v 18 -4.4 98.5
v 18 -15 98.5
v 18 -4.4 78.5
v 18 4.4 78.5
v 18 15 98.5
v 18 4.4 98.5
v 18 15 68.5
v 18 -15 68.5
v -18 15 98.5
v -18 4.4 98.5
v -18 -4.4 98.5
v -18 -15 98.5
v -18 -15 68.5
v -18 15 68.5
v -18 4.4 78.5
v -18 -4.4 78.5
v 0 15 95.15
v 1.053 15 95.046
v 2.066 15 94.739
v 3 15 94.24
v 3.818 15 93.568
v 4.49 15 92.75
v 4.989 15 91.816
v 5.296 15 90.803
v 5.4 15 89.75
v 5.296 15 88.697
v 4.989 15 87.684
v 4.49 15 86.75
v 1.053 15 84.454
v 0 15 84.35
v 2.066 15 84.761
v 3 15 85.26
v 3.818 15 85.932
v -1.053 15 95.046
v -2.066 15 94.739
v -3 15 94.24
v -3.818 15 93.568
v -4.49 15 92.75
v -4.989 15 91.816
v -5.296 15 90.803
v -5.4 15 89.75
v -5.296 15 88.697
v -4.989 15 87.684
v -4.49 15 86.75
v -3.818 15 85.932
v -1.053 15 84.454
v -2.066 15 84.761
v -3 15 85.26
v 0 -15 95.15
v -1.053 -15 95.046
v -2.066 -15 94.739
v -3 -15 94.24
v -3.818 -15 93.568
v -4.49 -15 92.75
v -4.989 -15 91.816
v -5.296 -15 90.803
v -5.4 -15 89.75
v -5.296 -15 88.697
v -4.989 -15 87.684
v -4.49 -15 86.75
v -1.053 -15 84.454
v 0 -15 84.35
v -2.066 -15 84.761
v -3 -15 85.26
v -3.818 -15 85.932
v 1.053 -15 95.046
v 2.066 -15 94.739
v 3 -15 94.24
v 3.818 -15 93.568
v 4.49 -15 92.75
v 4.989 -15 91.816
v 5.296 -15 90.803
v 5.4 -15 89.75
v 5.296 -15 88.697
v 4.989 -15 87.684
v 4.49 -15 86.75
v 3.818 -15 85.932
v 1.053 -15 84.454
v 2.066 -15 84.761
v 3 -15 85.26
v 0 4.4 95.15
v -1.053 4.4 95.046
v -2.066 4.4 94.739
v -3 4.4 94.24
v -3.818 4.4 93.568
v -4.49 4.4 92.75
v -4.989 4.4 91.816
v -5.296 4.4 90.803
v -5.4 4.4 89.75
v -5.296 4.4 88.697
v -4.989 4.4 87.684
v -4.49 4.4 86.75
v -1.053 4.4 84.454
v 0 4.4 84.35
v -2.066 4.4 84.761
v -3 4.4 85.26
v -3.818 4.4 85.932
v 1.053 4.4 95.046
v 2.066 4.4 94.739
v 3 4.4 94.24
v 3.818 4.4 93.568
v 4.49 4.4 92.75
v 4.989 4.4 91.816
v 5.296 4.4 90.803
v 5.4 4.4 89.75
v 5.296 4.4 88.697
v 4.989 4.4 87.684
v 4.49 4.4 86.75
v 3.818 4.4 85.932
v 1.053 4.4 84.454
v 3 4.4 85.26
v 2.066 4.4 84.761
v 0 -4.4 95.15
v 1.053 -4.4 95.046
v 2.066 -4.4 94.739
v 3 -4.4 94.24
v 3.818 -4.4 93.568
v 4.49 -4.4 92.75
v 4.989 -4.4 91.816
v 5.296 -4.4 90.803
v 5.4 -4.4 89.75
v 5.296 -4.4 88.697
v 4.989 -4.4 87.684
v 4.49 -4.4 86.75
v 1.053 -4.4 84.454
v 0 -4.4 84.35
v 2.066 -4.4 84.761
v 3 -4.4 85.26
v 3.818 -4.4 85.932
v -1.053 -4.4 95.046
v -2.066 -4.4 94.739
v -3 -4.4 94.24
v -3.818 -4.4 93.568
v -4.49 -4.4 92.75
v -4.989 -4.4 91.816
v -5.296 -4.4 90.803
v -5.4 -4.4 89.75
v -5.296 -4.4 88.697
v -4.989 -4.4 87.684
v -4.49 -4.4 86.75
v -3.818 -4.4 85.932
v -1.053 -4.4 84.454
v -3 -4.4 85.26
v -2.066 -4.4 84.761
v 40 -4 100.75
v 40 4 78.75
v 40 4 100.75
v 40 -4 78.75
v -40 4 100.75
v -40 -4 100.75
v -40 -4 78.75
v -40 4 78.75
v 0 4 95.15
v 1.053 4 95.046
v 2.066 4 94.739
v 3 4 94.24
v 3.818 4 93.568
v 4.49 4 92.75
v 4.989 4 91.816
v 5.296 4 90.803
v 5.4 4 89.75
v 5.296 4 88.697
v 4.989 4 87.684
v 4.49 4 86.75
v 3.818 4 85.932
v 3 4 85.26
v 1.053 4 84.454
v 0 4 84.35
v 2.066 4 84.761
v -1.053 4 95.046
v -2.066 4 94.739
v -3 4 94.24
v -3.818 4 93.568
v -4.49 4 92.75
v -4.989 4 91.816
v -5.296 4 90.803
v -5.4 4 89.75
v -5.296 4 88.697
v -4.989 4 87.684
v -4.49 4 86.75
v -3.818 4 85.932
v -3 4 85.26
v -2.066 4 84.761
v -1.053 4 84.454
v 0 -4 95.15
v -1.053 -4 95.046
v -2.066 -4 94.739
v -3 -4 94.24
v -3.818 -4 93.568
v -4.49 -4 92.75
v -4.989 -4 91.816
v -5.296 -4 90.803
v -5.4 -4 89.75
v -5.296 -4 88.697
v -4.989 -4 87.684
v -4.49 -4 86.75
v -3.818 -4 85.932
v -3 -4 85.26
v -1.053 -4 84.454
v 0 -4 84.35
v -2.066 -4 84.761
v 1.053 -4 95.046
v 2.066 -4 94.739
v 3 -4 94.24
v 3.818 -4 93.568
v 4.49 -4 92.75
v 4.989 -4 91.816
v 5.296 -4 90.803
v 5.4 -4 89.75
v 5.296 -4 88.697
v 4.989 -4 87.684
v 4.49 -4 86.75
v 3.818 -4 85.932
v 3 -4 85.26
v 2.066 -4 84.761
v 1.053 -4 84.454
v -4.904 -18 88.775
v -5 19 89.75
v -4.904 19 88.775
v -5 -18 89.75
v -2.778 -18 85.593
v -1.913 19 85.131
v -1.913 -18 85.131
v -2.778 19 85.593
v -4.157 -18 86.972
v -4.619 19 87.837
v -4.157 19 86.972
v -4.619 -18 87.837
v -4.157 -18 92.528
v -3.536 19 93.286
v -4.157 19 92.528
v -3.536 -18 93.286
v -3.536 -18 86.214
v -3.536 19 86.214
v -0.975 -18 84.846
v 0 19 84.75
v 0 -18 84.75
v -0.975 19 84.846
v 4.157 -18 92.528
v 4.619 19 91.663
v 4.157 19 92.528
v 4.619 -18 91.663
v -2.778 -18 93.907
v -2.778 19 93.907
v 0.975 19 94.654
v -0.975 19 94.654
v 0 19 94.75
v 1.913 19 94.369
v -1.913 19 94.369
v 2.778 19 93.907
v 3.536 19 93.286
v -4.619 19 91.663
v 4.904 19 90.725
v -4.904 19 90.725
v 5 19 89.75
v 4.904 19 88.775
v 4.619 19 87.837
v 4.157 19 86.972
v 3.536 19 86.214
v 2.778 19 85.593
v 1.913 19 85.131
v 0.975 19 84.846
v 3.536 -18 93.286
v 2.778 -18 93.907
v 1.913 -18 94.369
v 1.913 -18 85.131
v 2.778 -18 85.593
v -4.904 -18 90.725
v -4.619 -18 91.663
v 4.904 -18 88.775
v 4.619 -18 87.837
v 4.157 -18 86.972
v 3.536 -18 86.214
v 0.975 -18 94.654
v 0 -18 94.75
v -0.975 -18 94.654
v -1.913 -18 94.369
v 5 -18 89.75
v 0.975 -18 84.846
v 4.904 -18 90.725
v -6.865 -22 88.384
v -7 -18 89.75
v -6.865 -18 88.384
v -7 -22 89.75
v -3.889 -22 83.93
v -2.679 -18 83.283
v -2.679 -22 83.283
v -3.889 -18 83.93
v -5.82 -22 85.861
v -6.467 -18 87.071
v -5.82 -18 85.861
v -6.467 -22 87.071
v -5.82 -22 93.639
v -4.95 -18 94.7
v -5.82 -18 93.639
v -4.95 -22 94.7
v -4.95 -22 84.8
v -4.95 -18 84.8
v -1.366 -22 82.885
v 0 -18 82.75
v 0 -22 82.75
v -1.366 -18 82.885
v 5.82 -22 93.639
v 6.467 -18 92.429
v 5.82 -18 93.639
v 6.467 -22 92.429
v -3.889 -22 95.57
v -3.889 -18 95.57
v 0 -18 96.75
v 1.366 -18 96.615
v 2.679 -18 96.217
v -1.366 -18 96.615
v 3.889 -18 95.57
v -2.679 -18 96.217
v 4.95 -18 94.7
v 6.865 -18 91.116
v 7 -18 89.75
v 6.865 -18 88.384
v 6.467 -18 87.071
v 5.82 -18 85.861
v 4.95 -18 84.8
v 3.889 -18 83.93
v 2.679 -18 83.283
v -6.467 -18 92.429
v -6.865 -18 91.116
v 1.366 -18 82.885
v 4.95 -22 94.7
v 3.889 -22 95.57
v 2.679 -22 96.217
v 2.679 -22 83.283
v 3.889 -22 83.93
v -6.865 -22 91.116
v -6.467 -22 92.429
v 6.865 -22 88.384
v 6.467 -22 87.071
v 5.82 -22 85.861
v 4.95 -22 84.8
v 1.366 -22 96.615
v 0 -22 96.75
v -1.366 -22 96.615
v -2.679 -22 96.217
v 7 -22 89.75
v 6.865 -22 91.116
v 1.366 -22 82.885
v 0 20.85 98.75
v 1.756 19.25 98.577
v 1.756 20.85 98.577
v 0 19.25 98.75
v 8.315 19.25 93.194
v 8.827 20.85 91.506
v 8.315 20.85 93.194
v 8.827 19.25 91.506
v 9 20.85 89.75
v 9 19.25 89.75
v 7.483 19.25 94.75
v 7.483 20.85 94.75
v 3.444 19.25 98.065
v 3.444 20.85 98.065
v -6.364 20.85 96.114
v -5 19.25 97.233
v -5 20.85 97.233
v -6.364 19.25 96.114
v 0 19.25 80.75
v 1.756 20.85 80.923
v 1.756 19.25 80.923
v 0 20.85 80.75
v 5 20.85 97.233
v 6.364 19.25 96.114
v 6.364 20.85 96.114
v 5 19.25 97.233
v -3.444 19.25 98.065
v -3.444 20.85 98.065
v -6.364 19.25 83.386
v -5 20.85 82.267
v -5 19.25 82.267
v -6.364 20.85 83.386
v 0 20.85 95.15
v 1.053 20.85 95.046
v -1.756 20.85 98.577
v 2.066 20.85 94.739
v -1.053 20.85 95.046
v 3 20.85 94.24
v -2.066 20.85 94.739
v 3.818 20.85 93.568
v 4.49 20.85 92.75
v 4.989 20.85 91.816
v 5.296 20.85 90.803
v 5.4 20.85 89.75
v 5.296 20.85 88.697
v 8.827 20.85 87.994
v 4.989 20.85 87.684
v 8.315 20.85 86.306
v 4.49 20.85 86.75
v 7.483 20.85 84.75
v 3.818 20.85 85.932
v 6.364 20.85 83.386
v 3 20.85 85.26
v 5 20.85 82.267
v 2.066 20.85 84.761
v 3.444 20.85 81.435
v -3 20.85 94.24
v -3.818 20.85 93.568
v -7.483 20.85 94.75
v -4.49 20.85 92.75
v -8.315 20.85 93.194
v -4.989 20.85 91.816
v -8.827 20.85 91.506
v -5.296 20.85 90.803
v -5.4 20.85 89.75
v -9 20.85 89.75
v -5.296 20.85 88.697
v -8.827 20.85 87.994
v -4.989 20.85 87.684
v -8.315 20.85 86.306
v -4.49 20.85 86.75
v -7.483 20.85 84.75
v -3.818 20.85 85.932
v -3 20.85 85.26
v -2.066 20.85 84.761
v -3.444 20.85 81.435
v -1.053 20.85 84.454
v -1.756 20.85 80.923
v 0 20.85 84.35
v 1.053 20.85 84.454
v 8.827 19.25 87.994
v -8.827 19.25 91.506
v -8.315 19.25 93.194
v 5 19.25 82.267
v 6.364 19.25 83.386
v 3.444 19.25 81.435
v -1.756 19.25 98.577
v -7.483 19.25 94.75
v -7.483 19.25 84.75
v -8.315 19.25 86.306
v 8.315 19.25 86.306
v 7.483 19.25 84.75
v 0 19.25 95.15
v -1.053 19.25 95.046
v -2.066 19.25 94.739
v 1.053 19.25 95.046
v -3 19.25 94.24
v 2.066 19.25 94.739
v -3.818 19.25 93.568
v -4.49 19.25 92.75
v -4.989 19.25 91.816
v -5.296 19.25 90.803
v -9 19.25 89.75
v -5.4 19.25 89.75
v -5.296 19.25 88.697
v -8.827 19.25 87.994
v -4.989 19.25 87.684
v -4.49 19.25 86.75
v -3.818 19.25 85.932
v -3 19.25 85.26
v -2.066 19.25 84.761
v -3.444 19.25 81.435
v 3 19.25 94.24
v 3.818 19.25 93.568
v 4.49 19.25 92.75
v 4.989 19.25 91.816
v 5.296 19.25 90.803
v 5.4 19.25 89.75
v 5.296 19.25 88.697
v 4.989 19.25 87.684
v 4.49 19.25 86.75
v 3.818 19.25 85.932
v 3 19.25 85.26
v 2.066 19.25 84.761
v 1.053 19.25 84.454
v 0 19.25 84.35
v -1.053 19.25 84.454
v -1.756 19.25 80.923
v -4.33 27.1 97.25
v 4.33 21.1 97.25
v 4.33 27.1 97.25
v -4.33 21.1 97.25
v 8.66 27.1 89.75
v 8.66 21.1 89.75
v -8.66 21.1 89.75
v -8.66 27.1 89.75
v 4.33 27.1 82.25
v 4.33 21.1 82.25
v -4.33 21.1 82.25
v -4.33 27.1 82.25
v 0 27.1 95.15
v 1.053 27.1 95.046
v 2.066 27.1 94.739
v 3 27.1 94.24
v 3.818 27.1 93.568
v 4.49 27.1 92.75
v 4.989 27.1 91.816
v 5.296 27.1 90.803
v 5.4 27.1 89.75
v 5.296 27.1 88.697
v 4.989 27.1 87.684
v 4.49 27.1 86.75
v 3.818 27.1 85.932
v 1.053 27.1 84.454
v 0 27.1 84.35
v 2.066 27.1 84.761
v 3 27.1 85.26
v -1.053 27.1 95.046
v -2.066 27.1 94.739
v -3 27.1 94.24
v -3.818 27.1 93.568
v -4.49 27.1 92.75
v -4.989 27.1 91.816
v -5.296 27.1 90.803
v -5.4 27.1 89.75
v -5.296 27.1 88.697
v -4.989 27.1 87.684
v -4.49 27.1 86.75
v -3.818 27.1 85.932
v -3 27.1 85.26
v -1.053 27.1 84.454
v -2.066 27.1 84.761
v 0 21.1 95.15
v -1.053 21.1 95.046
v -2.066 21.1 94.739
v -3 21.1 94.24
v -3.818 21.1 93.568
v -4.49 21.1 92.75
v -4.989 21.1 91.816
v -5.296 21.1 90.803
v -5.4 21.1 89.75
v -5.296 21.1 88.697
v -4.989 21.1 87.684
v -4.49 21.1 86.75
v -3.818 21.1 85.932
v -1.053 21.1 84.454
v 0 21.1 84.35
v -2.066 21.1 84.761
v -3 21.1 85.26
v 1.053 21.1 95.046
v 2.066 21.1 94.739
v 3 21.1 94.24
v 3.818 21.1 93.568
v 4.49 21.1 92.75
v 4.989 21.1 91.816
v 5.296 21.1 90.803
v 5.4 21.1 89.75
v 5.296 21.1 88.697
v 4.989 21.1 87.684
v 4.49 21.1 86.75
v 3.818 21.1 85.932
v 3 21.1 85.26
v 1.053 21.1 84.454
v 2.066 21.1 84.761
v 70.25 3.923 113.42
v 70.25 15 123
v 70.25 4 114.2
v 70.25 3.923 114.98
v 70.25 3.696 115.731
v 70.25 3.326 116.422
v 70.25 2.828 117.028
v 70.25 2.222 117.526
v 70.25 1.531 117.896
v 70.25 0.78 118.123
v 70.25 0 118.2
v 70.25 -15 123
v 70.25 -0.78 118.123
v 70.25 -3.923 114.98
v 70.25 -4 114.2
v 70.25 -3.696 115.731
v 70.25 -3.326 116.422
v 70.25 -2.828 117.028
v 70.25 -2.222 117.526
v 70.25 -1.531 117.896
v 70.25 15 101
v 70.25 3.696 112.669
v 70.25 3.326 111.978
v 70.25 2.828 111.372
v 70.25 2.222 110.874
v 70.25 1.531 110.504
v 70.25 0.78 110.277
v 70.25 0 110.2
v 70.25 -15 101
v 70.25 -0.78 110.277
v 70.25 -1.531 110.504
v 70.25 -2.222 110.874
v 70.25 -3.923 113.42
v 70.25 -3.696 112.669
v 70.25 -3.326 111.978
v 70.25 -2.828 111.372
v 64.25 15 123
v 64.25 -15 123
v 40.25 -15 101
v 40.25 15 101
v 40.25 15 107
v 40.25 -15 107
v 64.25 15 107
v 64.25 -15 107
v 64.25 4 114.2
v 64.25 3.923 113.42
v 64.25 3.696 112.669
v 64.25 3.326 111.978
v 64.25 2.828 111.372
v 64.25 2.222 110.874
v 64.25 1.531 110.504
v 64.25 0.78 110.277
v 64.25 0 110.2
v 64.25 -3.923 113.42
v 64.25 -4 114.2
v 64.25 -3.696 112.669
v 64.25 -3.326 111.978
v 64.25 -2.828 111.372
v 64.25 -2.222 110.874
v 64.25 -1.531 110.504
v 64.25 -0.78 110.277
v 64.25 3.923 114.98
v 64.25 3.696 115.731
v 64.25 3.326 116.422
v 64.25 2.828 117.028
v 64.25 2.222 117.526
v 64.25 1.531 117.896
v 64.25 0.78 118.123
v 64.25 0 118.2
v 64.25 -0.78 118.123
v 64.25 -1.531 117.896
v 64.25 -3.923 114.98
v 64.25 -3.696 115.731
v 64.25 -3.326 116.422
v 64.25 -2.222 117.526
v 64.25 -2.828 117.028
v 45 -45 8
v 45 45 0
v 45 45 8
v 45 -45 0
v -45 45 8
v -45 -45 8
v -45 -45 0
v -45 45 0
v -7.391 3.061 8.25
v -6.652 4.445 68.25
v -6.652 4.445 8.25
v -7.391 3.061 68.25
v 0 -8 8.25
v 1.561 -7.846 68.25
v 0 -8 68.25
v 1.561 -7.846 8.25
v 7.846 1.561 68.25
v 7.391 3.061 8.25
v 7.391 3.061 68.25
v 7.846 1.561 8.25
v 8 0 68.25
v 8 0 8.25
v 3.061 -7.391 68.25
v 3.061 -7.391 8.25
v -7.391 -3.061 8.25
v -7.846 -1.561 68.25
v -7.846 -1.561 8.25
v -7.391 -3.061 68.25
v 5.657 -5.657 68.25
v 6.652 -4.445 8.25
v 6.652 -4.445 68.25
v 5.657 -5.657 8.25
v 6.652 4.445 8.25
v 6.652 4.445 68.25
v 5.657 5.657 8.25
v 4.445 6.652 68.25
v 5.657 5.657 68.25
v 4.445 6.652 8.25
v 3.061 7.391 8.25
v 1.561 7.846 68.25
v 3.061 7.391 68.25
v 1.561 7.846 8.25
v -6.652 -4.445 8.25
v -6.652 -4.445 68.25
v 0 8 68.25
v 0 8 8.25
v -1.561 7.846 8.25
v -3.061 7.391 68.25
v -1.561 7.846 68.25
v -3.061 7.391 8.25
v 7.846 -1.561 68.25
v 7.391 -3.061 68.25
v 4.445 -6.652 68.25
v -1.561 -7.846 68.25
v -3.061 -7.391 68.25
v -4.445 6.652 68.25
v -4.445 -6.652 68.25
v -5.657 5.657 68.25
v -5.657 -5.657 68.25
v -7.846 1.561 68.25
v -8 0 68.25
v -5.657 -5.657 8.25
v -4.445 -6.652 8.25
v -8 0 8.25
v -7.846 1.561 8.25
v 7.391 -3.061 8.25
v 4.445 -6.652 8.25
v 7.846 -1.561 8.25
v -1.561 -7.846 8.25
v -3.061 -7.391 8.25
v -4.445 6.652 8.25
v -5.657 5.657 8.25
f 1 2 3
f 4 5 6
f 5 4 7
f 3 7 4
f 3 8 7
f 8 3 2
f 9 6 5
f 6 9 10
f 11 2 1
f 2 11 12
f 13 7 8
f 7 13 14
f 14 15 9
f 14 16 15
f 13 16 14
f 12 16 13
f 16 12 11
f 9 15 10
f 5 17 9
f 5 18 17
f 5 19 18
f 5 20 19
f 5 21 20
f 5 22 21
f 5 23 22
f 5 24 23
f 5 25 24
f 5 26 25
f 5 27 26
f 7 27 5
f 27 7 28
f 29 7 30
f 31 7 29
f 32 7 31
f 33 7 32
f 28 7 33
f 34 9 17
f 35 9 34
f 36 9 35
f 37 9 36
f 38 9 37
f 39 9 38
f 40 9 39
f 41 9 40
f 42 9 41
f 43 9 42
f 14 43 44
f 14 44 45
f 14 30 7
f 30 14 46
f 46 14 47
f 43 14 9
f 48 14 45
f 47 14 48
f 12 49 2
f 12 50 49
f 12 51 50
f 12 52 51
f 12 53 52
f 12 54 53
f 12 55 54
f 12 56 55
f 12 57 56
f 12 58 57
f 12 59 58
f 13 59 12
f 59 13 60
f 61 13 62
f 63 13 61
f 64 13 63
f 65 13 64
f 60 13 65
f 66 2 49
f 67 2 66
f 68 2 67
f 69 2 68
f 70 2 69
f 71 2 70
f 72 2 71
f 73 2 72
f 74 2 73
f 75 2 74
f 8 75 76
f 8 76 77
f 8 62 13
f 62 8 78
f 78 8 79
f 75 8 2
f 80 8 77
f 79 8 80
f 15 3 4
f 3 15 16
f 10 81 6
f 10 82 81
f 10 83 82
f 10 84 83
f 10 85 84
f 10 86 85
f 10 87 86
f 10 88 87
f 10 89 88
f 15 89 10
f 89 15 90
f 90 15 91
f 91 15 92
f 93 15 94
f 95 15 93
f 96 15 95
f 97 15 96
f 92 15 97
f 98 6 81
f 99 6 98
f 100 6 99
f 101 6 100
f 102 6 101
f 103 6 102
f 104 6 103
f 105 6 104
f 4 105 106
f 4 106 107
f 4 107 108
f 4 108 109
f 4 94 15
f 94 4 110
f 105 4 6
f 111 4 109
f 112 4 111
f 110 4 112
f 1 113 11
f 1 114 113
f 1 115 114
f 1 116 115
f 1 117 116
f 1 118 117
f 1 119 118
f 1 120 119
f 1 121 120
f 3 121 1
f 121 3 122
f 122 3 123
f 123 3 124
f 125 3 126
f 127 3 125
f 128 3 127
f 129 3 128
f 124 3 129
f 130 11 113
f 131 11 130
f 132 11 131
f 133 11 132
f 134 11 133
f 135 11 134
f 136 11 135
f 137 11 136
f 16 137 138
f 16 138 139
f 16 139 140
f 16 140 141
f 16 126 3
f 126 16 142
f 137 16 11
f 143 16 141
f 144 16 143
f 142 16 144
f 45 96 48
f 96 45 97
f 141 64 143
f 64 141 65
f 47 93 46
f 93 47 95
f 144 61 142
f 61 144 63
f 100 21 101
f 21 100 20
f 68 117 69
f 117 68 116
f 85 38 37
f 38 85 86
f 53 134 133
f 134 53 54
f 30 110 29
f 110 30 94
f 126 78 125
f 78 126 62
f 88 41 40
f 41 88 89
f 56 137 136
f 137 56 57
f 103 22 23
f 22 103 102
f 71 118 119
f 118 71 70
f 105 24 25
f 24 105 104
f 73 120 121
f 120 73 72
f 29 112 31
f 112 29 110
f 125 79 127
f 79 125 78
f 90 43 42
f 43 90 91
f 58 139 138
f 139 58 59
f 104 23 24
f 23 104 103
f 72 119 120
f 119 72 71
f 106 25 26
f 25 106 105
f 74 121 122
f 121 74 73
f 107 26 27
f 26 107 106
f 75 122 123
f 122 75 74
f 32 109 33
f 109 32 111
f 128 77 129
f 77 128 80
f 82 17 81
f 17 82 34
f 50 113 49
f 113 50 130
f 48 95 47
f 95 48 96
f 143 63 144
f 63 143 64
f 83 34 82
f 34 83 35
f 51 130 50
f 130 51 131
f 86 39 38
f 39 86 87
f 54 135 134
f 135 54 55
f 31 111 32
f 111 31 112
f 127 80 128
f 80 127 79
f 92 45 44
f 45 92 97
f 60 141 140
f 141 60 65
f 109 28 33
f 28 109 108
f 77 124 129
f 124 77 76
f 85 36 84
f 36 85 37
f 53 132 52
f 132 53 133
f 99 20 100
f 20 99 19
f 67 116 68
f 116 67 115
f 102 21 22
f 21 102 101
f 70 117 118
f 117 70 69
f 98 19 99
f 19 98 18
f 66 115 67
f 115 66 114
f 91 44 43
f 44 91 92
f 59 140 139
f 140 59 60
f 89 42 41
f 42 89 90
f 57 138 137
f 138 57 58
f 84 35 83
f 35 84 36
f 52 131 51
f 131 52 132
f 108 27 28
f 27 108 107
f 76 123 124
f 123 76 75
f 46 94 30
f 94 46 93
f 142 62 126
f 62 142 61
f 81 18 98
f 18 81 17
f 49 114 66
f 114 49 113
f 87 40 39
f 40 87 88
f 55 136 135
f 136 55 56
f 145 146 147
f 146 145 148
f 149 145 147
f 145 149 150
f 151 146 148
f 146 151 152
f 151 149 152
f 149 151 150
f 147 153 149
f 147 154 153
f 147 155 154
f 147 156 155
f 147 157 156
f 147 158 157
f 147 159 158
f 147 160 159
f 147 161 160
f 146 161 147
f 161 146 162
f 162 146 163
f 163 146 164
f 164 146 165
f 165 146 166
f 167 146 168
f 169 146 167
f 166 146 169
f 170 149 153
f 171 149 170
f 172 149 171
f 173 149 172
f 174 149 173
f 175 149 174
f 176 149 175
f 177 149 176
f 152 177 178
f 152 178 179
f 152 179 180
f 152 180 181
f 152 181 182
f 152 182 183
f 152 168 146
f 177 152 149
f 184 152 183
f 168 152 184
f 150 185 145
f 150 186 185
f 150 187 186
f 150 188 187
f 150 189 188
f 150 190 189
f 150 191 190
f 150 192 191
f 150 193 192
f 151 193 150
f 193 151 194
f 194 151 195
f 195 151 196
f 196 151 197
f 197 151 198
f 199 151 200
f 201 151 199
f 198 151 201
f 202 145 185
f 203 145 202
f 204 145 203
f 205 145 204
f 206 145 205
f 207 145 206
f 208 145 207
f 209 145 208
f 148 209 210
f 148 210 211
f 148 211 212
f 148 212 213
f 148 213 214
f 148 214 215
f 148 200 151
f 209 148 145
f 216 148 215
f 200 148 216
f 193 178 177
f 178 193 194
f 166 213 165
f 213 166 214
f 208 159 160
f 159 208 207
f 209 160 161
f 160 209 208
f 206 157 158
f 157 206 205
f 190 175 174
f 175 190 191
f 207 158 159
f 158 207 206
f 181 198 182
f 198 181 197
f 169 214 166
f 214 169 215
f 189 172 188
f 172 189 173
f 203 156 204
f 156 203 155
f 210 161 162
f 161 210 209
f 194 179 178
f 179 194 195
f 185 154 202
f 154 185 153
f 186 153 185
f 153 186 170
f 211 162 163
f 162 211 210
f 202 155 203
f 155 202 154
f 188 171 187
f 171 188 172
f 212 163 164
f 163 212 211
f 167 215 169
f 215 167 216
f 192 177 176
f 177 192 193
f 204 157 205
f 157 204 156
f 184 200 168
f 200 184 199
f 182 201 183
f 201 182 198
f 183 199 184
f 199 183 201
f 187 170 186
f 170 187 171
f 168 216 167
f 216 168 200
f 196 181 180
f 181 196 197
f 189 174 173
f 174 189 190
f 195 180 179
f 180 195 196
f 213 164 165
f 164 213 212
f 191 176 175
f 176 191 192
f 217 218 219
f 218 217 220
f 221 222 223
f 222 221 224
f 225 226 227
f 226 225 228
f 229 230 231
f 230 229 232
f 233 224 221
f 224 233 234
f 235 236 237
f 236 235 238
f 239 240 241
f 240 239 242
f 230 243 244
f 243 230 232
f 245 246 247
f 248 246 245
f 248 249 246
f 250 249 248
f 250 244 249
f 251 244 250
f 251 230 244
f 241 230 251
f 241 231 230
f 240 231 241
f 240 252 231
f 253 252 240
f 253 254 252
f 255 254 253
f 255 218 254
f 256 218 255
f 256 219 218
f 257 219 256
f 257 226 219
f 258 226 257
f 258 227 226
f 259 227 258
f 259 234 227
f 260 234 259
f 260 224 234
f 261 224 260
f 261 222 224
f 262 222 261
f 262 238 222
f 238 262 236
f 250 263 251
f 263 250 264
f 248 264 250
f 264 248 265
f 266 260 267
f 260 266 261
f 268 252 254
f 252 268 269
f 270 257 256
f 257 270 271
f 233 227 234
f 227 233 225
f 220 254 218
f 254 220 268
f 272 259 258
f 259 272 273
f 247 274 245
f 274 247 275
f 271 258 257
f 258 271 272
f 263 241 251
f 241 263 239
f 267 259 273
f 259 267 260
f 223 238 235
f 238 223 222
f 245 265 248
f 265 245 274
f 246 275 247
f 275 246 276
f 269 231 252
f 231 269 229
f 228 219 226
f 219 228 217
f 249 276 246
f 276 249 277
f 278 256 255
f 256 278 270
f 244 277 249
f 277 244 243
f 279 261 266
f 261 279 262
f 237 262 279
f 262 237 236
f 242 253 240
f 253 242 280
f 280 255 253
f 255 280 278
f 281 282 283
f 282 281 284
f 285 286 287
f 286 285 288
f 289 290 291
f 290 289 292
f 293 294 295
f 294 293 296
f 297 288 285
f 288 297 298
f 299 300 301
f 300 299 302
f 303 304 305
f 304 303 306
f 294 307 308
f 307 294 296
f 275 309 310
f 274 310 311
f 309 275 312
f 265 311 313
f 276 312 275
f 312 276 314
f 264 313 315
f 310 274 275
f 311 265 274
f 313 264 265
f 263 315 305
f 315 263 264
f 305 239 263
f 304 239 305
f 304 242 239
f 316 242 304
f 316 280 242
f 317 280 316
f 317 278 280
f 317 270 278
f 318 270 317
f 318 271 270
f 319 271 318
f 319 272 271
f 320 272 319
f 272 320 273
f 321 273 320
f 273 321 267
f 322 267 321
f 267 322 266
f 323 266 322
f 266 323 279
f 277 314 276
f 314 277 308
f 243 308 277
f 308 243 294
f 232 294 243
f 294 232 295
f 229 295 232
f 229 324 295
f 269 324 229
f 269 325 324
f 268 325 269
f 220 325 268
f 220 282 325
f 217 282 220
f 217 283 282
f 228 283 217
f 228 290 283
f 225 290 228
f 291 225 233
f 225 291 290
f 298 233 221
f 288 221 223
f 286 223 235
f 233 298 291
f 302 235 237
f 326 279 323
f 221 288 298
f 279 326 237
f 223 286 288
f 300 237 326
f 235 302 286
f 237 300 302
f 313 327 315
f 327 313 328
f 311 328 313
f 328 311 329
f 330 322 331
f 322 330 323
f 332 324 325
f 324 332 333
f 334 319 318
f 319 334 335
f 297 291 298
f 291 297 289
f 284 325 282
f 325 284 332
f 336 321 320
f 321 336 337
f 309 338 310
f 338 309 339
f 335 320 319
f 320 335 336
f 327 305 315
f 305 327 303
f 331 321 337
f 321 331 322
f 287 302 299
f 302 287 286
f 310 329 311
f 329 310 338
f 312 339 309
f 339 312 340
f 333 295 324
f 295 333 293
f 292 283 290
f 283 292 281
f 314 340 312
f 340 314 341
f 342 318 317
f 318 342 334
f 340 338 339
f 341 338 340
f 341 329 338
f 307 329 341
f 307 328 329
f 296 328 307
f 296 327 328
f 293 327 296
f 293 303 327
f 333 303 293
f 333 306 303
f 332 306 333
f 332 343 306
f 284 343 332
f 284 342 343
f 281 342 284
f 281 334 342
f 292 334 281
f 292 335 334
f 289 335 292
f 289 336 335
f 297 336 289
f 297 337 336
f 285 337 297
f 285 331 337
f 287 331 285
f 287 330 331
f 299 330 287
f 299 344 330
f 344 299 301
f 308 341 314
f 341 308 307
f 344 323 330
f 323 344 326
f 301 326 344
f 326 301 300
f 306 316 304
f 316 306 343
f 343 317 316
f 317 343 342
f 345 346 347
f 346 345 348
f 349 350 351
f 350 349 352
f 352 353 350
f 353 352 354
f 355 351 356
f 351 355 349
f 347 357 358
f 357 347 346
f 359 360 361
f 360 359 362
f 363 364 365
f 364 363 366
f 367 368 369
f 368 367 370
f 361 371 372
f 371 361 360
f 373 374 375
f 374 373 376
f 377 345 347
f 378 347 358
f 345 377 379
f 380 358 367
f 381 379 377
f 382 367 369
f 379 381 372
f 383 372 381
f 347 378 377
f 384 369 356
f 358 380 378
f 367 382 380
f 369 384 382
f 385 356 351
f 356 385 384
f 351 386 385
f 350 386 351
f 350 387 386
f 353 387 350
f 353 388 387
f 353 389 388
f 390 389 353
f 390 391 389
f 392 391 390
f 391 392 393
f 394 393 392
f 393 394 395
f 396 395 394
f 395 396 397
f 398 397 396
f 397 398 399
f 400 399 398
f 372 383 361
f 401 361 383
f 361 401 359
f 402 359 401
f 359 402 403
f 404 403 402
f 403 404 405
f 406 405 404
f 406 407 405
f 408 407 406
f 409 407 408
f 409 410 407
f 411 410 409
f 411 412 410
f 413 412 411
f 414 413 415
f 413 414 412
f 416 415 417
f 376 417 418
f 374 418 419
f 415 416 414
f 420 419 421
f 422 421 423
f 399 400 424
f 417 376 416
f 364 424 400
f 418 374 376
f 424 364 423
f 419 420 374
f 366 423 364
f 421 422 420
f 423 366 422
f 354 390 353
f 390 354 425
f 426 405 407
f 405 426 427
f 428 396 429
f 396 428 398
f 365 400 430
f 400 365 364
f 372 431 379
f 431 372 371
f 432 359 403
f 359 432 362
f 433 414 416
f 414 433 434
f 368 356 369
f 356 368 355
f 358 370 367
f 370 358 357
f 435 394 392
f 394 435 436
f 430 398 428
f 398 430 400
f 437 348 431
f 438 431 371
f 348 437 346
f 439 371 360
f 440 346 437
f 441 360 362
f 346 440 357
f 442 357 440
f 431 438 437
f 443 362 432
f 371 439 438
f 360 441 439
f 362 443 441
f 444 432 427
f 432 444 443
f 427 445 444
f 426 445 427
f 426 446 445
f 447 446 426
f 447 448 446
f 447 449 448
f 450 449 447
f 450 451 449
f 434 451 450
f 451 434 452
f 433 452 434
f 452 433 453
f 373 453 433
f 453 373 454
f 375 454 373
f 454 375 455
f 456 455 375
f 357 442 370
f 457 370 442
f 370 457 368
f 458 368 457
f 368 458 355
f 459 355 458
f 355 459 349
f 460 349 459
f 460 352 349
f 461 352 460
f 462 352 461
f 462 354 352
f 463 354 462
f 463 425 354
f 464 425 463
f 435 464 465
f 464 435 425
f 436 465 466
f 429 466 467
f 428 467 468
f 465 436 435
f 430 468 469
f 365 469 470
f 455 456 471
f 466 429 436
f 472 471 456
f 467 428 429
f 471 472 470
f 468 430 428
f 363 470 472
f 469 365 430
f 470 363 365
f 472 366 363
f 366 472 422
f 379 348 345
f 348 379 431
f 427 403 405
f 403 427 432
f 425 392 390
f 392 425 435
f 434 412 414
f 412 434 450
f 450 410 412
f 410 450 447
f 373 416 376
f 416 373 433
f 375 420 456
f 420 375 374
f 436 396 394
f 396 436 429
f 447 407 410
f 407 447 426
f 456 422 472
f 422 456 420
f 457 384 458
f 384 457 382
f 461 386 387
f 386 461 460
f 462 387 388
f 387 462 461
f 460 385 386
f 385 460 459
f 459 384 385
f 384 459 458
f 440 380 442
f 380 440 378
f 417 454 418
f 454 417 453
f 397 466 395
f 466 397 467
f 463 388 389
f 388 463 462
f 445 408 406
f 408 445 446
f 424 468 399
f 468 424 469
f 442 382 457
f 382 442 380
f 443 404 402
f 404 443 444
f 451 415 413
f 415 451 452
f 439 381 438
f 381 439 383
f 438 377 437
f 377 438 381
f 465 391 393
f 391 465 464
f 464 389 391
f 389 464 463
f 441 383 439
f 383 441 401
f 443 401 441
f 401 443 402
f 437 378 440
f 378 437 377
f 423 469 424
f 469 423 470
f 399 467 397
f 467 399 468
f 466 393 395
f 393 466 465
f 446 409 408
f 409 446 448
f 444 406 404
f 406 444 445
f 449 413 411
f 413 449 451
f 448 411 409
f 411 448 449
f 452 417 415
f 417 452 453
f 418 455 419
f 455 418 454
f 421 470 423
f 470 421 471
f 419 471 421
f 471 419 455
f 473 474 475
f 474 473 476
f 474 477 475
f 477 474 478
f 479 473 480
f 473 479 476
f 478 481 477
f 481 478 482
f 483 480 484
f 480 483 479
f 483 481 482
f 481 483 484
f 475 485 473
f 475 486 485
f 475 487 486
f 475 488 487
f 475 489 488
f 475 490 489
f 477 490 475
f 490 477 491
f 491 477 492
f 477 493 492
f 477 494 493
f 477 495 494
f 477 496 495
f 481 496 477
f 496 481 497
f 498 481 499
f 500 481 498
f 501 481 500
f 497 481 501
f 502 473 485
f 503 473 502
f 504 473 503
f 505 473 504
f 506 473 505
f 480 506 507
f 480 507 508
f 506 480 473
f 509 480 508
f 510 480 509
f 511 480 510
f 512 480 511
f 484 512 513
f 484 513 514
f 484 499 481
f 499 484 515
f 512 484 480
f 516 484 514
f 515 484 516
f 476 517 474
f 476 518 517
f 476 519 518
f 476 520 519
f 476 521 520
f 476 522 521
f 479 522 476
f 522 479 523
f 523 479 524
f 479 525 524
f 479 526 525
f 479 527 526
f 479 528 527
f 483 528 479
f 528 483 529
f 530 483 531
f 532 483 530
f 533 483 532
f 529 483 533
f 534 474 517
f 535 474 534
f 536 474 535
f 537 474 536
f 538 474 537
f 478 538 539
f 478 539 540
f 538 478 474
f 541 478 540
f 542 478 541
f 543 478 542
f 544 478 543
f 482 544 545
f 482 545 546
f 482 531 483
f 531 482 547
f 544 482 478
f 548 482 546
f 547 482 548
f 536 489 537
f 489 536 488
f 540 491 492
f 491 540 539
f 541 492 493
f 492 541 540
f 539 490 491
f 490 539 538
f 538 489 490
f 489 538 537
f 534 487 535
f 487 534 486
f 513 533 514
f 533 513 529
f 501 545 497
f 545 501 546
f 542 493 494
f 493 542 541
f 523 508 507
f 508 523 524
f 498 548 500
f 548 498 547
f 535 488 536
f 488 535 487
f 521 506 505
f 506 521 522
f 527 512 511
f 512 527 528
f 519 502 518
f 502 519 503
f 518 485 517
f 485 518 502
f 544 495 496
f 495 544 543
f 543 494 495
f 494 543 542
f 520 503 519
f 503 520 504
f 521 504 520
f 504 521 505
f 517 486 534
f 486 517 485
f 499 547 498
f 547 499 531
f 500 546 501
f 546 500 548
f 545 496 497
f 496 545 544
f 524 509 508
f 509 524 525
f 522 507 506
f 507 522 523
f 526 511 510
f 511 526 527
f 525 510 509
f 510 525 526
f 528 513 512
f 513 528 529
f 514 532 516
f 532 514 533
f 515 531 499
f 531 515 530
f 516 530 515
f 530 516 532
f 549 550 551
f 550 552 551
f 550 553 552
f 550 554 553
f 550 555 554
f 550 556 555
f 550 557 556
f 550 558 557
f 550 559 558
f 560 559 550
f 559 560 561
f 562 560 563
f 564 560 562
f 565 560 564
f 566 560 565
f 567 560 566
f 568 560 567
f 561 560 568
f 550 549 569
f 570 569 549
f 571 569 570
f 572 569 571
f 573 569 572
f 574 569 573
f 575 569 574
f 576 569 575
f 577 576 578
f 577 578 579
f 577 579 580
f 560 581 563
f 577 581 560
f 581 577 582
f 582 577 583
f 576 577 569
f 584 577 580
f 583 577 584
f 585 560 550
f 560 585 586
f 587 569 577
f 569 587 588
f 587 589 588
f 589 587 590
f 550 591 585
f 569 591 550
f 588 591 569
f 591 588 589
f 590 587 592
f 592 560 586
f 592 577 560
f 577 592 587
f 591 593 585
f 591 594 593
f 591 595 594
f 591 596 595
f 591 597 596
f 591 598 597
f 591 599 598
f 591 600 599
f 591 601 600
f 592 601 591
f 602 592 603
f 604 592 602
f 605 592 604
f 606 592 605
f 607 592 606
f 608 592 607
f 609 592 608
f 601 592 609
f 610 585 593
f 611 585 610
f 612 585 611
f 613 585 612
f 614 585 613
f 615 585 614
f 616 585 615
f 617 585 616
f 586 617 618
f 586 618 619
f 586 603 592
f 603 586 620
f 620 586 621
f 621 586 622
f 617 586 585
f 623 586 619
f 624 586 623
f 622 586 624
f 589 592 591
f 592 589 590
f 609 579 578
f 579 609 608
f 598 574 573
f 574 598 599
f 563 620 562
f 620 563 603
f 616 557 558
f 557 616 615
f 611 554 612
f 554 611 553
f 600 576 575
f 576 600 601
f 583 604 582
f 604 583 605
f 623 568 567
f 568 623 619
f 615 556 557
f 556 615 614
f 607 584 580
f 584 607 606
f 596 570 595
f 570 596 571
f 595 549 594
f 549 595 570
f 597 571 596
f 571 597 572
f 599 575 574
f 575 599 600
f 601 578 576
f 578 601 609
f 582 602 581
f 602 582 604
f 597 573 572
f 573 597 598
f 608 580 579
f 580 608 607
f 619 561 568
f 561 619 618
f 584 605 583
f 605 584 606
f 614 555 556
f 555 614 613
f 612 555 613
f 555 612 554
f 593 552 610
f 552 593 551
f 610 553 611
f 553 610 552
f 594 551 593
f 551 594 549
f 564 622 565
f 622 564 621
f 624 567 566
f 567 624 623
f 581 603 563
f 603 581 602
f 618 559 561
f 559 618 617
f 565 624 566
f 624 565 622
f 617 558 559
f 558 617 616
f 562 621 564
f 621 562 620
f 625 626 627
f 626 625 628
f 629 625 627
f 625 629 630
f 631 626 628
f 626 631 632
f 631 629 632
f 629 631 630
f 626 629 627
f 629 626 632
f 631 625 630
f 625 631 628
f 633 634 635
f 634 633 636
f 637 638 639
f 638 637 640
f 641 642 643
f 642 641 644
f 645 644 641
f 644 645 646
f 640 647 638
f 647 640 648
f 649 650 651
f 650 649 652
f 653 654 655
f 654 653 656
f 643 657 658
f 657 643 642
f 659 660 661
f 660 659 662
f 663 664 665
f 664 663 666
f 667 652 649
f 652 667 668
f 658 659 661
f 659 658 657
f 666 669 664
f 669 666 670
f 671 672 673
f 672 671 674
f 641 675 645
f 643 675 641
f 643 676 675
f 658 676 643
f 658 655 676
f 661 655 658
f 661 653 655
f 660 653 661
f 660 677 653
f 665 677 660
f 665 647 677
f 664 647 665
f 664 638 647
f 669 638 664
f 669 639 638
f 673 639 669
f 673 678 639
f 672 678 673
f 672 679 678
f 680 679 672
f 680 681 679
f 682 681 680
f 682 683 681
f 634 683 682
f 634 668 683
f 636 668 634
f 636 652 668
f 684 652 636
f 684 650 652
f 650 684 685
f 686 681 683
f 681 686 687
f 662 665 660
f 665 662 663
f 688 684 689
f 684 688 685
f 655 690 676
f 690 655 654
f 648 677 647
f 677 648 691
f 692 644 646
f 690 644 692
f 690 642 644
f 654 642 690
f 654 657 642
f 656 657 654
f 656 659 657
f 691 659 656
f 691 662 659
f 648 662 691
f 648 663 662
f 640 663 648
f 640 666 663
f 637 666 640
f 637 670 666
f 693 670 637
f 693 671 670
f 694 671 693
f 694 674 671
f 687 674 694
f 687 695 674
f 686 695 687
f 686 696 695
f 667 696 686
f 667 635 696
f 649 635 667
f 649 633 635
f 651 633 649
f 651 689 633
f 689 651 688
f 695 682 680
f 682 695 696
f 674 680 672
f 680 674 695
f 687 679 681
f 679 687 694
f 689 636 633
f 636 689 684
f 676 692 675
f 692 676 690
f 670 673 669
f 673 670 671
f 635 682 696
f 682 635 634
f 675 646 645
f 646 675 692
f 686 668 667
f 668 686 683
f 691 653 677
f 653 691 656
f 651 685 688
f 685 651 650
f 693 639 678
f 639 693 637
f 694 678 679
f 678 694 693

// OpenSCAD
$fn = 32;

// ------------------------------------------------------------------------
// Lamp arm: column d16 x 60 mm, arm 80 mm
// Every part is its own module, assembly() places every instance.
// ------------------------------------------------------------------------

// --- part 1 ---
module lamp_base() {
  difference() {
    translate([-45, -45, 0]) cube([90, 90, 8]);
  }
}

// --- part 2 ---
module lamp_column() {
  cylinder(h = 60, d = 16);
}

// --- part 3 ---
module head_fork() {
  difference() {
    translate([-18, -15, 0]) cube([36, 30, 30]);
    translate([-19, -4.4, 10]) cube([38, 8.8, 21]);
    translate([0, 0, 21.25]) rotate([90, 0, 0]) cylinder(h = 32, d = 10.8, center = true);
  }
}

// --- part 4 ---
module lamp_arm() {
  difference() {
    translate([-40, -4, 0]) cube([80, 8, 22]);
    translate([0, 0, 11]) rotate([90, 0, 0]) cylinder(h = 10, d = 10.8, center = true);
  }
}

// --- part 5 ---
module arm_pin() {
  rotate([0, 90, 0]) cylinder(h = 38, d = 10, center = true);
  translate([-22, 0, 0]) rotate([0, 90, 0]) cylinder(h = 4, d = 14);
}

// --- part 6 ---
module arm_washer() {
  difference() {
      translate([0, 0, 0]) cylinder(h = 1.6, d = 18);
      translate([0, 0, -1]) cylinder(h = 3.6, d = 10.8);
    }
}

// --- part 7 ---
module arm_nut() {
  difference() {
    linear_extrude(height = 6) polygon(points = [[8.66, 0], [4.33, 7.5], [-4.33, 7.5], [-8.66, 0], [-4.33, -7.5], [4.33, -7.5]]);
    translate([0, 0, -1]) cylinder(h = 8, d = 10.8);
  }
}

// --- part 8 ---
module shade_bracket() {
  difference() {
    translate([-15, -15, 0]) cube([30, 30, 22]);
    translate([-16, -16, 6]) cube([25, 32, 17]);
    translate([12, 0, 13.2]) rotate([0, 90, 0]) cylinder(h = 8, d = 8, center = true);
  }
}

// --- assembly ---
module assembly() {
  color([0.80, 0.24, 0.20]) translate([0, 0, 0]) rotate([0, 0, 0]) lamp_base();
  color([0.20, 0.45, 0.75]) translate([0, 0, 8.25]) rotate([0, 0, 0]) lamp_column();
  color([0.25, 0.62, 0.32]) translate([0, 0, 68.5]) rotate([0, 0, 0]) head_fork();
  color([0.92, 0.70, 0.18]) translate([0, 0, 78.75]) rotate([0, 0, 0]) lamp_arm();
  color([0.58, 0.35, 0.70]) translate([0, 0, 89.75]) rotate([0, 0, 90]) arm_pin();
  color([0.16, 0.66, 0.66]) translate([0, 20.85, 89.75]) rotate([90, 0, 0]) arm_washer();
  color([0.85, 0.48, 0.18]) translate([0, 27.1, 89.75]) rotate([90, 0, 0]) arm_nut();
  color([0.55, 0.60, 0.65]) translate([55.25, 0, 101]) rotate([0, 0, 0]) shade_bracket();
}

assembly();
